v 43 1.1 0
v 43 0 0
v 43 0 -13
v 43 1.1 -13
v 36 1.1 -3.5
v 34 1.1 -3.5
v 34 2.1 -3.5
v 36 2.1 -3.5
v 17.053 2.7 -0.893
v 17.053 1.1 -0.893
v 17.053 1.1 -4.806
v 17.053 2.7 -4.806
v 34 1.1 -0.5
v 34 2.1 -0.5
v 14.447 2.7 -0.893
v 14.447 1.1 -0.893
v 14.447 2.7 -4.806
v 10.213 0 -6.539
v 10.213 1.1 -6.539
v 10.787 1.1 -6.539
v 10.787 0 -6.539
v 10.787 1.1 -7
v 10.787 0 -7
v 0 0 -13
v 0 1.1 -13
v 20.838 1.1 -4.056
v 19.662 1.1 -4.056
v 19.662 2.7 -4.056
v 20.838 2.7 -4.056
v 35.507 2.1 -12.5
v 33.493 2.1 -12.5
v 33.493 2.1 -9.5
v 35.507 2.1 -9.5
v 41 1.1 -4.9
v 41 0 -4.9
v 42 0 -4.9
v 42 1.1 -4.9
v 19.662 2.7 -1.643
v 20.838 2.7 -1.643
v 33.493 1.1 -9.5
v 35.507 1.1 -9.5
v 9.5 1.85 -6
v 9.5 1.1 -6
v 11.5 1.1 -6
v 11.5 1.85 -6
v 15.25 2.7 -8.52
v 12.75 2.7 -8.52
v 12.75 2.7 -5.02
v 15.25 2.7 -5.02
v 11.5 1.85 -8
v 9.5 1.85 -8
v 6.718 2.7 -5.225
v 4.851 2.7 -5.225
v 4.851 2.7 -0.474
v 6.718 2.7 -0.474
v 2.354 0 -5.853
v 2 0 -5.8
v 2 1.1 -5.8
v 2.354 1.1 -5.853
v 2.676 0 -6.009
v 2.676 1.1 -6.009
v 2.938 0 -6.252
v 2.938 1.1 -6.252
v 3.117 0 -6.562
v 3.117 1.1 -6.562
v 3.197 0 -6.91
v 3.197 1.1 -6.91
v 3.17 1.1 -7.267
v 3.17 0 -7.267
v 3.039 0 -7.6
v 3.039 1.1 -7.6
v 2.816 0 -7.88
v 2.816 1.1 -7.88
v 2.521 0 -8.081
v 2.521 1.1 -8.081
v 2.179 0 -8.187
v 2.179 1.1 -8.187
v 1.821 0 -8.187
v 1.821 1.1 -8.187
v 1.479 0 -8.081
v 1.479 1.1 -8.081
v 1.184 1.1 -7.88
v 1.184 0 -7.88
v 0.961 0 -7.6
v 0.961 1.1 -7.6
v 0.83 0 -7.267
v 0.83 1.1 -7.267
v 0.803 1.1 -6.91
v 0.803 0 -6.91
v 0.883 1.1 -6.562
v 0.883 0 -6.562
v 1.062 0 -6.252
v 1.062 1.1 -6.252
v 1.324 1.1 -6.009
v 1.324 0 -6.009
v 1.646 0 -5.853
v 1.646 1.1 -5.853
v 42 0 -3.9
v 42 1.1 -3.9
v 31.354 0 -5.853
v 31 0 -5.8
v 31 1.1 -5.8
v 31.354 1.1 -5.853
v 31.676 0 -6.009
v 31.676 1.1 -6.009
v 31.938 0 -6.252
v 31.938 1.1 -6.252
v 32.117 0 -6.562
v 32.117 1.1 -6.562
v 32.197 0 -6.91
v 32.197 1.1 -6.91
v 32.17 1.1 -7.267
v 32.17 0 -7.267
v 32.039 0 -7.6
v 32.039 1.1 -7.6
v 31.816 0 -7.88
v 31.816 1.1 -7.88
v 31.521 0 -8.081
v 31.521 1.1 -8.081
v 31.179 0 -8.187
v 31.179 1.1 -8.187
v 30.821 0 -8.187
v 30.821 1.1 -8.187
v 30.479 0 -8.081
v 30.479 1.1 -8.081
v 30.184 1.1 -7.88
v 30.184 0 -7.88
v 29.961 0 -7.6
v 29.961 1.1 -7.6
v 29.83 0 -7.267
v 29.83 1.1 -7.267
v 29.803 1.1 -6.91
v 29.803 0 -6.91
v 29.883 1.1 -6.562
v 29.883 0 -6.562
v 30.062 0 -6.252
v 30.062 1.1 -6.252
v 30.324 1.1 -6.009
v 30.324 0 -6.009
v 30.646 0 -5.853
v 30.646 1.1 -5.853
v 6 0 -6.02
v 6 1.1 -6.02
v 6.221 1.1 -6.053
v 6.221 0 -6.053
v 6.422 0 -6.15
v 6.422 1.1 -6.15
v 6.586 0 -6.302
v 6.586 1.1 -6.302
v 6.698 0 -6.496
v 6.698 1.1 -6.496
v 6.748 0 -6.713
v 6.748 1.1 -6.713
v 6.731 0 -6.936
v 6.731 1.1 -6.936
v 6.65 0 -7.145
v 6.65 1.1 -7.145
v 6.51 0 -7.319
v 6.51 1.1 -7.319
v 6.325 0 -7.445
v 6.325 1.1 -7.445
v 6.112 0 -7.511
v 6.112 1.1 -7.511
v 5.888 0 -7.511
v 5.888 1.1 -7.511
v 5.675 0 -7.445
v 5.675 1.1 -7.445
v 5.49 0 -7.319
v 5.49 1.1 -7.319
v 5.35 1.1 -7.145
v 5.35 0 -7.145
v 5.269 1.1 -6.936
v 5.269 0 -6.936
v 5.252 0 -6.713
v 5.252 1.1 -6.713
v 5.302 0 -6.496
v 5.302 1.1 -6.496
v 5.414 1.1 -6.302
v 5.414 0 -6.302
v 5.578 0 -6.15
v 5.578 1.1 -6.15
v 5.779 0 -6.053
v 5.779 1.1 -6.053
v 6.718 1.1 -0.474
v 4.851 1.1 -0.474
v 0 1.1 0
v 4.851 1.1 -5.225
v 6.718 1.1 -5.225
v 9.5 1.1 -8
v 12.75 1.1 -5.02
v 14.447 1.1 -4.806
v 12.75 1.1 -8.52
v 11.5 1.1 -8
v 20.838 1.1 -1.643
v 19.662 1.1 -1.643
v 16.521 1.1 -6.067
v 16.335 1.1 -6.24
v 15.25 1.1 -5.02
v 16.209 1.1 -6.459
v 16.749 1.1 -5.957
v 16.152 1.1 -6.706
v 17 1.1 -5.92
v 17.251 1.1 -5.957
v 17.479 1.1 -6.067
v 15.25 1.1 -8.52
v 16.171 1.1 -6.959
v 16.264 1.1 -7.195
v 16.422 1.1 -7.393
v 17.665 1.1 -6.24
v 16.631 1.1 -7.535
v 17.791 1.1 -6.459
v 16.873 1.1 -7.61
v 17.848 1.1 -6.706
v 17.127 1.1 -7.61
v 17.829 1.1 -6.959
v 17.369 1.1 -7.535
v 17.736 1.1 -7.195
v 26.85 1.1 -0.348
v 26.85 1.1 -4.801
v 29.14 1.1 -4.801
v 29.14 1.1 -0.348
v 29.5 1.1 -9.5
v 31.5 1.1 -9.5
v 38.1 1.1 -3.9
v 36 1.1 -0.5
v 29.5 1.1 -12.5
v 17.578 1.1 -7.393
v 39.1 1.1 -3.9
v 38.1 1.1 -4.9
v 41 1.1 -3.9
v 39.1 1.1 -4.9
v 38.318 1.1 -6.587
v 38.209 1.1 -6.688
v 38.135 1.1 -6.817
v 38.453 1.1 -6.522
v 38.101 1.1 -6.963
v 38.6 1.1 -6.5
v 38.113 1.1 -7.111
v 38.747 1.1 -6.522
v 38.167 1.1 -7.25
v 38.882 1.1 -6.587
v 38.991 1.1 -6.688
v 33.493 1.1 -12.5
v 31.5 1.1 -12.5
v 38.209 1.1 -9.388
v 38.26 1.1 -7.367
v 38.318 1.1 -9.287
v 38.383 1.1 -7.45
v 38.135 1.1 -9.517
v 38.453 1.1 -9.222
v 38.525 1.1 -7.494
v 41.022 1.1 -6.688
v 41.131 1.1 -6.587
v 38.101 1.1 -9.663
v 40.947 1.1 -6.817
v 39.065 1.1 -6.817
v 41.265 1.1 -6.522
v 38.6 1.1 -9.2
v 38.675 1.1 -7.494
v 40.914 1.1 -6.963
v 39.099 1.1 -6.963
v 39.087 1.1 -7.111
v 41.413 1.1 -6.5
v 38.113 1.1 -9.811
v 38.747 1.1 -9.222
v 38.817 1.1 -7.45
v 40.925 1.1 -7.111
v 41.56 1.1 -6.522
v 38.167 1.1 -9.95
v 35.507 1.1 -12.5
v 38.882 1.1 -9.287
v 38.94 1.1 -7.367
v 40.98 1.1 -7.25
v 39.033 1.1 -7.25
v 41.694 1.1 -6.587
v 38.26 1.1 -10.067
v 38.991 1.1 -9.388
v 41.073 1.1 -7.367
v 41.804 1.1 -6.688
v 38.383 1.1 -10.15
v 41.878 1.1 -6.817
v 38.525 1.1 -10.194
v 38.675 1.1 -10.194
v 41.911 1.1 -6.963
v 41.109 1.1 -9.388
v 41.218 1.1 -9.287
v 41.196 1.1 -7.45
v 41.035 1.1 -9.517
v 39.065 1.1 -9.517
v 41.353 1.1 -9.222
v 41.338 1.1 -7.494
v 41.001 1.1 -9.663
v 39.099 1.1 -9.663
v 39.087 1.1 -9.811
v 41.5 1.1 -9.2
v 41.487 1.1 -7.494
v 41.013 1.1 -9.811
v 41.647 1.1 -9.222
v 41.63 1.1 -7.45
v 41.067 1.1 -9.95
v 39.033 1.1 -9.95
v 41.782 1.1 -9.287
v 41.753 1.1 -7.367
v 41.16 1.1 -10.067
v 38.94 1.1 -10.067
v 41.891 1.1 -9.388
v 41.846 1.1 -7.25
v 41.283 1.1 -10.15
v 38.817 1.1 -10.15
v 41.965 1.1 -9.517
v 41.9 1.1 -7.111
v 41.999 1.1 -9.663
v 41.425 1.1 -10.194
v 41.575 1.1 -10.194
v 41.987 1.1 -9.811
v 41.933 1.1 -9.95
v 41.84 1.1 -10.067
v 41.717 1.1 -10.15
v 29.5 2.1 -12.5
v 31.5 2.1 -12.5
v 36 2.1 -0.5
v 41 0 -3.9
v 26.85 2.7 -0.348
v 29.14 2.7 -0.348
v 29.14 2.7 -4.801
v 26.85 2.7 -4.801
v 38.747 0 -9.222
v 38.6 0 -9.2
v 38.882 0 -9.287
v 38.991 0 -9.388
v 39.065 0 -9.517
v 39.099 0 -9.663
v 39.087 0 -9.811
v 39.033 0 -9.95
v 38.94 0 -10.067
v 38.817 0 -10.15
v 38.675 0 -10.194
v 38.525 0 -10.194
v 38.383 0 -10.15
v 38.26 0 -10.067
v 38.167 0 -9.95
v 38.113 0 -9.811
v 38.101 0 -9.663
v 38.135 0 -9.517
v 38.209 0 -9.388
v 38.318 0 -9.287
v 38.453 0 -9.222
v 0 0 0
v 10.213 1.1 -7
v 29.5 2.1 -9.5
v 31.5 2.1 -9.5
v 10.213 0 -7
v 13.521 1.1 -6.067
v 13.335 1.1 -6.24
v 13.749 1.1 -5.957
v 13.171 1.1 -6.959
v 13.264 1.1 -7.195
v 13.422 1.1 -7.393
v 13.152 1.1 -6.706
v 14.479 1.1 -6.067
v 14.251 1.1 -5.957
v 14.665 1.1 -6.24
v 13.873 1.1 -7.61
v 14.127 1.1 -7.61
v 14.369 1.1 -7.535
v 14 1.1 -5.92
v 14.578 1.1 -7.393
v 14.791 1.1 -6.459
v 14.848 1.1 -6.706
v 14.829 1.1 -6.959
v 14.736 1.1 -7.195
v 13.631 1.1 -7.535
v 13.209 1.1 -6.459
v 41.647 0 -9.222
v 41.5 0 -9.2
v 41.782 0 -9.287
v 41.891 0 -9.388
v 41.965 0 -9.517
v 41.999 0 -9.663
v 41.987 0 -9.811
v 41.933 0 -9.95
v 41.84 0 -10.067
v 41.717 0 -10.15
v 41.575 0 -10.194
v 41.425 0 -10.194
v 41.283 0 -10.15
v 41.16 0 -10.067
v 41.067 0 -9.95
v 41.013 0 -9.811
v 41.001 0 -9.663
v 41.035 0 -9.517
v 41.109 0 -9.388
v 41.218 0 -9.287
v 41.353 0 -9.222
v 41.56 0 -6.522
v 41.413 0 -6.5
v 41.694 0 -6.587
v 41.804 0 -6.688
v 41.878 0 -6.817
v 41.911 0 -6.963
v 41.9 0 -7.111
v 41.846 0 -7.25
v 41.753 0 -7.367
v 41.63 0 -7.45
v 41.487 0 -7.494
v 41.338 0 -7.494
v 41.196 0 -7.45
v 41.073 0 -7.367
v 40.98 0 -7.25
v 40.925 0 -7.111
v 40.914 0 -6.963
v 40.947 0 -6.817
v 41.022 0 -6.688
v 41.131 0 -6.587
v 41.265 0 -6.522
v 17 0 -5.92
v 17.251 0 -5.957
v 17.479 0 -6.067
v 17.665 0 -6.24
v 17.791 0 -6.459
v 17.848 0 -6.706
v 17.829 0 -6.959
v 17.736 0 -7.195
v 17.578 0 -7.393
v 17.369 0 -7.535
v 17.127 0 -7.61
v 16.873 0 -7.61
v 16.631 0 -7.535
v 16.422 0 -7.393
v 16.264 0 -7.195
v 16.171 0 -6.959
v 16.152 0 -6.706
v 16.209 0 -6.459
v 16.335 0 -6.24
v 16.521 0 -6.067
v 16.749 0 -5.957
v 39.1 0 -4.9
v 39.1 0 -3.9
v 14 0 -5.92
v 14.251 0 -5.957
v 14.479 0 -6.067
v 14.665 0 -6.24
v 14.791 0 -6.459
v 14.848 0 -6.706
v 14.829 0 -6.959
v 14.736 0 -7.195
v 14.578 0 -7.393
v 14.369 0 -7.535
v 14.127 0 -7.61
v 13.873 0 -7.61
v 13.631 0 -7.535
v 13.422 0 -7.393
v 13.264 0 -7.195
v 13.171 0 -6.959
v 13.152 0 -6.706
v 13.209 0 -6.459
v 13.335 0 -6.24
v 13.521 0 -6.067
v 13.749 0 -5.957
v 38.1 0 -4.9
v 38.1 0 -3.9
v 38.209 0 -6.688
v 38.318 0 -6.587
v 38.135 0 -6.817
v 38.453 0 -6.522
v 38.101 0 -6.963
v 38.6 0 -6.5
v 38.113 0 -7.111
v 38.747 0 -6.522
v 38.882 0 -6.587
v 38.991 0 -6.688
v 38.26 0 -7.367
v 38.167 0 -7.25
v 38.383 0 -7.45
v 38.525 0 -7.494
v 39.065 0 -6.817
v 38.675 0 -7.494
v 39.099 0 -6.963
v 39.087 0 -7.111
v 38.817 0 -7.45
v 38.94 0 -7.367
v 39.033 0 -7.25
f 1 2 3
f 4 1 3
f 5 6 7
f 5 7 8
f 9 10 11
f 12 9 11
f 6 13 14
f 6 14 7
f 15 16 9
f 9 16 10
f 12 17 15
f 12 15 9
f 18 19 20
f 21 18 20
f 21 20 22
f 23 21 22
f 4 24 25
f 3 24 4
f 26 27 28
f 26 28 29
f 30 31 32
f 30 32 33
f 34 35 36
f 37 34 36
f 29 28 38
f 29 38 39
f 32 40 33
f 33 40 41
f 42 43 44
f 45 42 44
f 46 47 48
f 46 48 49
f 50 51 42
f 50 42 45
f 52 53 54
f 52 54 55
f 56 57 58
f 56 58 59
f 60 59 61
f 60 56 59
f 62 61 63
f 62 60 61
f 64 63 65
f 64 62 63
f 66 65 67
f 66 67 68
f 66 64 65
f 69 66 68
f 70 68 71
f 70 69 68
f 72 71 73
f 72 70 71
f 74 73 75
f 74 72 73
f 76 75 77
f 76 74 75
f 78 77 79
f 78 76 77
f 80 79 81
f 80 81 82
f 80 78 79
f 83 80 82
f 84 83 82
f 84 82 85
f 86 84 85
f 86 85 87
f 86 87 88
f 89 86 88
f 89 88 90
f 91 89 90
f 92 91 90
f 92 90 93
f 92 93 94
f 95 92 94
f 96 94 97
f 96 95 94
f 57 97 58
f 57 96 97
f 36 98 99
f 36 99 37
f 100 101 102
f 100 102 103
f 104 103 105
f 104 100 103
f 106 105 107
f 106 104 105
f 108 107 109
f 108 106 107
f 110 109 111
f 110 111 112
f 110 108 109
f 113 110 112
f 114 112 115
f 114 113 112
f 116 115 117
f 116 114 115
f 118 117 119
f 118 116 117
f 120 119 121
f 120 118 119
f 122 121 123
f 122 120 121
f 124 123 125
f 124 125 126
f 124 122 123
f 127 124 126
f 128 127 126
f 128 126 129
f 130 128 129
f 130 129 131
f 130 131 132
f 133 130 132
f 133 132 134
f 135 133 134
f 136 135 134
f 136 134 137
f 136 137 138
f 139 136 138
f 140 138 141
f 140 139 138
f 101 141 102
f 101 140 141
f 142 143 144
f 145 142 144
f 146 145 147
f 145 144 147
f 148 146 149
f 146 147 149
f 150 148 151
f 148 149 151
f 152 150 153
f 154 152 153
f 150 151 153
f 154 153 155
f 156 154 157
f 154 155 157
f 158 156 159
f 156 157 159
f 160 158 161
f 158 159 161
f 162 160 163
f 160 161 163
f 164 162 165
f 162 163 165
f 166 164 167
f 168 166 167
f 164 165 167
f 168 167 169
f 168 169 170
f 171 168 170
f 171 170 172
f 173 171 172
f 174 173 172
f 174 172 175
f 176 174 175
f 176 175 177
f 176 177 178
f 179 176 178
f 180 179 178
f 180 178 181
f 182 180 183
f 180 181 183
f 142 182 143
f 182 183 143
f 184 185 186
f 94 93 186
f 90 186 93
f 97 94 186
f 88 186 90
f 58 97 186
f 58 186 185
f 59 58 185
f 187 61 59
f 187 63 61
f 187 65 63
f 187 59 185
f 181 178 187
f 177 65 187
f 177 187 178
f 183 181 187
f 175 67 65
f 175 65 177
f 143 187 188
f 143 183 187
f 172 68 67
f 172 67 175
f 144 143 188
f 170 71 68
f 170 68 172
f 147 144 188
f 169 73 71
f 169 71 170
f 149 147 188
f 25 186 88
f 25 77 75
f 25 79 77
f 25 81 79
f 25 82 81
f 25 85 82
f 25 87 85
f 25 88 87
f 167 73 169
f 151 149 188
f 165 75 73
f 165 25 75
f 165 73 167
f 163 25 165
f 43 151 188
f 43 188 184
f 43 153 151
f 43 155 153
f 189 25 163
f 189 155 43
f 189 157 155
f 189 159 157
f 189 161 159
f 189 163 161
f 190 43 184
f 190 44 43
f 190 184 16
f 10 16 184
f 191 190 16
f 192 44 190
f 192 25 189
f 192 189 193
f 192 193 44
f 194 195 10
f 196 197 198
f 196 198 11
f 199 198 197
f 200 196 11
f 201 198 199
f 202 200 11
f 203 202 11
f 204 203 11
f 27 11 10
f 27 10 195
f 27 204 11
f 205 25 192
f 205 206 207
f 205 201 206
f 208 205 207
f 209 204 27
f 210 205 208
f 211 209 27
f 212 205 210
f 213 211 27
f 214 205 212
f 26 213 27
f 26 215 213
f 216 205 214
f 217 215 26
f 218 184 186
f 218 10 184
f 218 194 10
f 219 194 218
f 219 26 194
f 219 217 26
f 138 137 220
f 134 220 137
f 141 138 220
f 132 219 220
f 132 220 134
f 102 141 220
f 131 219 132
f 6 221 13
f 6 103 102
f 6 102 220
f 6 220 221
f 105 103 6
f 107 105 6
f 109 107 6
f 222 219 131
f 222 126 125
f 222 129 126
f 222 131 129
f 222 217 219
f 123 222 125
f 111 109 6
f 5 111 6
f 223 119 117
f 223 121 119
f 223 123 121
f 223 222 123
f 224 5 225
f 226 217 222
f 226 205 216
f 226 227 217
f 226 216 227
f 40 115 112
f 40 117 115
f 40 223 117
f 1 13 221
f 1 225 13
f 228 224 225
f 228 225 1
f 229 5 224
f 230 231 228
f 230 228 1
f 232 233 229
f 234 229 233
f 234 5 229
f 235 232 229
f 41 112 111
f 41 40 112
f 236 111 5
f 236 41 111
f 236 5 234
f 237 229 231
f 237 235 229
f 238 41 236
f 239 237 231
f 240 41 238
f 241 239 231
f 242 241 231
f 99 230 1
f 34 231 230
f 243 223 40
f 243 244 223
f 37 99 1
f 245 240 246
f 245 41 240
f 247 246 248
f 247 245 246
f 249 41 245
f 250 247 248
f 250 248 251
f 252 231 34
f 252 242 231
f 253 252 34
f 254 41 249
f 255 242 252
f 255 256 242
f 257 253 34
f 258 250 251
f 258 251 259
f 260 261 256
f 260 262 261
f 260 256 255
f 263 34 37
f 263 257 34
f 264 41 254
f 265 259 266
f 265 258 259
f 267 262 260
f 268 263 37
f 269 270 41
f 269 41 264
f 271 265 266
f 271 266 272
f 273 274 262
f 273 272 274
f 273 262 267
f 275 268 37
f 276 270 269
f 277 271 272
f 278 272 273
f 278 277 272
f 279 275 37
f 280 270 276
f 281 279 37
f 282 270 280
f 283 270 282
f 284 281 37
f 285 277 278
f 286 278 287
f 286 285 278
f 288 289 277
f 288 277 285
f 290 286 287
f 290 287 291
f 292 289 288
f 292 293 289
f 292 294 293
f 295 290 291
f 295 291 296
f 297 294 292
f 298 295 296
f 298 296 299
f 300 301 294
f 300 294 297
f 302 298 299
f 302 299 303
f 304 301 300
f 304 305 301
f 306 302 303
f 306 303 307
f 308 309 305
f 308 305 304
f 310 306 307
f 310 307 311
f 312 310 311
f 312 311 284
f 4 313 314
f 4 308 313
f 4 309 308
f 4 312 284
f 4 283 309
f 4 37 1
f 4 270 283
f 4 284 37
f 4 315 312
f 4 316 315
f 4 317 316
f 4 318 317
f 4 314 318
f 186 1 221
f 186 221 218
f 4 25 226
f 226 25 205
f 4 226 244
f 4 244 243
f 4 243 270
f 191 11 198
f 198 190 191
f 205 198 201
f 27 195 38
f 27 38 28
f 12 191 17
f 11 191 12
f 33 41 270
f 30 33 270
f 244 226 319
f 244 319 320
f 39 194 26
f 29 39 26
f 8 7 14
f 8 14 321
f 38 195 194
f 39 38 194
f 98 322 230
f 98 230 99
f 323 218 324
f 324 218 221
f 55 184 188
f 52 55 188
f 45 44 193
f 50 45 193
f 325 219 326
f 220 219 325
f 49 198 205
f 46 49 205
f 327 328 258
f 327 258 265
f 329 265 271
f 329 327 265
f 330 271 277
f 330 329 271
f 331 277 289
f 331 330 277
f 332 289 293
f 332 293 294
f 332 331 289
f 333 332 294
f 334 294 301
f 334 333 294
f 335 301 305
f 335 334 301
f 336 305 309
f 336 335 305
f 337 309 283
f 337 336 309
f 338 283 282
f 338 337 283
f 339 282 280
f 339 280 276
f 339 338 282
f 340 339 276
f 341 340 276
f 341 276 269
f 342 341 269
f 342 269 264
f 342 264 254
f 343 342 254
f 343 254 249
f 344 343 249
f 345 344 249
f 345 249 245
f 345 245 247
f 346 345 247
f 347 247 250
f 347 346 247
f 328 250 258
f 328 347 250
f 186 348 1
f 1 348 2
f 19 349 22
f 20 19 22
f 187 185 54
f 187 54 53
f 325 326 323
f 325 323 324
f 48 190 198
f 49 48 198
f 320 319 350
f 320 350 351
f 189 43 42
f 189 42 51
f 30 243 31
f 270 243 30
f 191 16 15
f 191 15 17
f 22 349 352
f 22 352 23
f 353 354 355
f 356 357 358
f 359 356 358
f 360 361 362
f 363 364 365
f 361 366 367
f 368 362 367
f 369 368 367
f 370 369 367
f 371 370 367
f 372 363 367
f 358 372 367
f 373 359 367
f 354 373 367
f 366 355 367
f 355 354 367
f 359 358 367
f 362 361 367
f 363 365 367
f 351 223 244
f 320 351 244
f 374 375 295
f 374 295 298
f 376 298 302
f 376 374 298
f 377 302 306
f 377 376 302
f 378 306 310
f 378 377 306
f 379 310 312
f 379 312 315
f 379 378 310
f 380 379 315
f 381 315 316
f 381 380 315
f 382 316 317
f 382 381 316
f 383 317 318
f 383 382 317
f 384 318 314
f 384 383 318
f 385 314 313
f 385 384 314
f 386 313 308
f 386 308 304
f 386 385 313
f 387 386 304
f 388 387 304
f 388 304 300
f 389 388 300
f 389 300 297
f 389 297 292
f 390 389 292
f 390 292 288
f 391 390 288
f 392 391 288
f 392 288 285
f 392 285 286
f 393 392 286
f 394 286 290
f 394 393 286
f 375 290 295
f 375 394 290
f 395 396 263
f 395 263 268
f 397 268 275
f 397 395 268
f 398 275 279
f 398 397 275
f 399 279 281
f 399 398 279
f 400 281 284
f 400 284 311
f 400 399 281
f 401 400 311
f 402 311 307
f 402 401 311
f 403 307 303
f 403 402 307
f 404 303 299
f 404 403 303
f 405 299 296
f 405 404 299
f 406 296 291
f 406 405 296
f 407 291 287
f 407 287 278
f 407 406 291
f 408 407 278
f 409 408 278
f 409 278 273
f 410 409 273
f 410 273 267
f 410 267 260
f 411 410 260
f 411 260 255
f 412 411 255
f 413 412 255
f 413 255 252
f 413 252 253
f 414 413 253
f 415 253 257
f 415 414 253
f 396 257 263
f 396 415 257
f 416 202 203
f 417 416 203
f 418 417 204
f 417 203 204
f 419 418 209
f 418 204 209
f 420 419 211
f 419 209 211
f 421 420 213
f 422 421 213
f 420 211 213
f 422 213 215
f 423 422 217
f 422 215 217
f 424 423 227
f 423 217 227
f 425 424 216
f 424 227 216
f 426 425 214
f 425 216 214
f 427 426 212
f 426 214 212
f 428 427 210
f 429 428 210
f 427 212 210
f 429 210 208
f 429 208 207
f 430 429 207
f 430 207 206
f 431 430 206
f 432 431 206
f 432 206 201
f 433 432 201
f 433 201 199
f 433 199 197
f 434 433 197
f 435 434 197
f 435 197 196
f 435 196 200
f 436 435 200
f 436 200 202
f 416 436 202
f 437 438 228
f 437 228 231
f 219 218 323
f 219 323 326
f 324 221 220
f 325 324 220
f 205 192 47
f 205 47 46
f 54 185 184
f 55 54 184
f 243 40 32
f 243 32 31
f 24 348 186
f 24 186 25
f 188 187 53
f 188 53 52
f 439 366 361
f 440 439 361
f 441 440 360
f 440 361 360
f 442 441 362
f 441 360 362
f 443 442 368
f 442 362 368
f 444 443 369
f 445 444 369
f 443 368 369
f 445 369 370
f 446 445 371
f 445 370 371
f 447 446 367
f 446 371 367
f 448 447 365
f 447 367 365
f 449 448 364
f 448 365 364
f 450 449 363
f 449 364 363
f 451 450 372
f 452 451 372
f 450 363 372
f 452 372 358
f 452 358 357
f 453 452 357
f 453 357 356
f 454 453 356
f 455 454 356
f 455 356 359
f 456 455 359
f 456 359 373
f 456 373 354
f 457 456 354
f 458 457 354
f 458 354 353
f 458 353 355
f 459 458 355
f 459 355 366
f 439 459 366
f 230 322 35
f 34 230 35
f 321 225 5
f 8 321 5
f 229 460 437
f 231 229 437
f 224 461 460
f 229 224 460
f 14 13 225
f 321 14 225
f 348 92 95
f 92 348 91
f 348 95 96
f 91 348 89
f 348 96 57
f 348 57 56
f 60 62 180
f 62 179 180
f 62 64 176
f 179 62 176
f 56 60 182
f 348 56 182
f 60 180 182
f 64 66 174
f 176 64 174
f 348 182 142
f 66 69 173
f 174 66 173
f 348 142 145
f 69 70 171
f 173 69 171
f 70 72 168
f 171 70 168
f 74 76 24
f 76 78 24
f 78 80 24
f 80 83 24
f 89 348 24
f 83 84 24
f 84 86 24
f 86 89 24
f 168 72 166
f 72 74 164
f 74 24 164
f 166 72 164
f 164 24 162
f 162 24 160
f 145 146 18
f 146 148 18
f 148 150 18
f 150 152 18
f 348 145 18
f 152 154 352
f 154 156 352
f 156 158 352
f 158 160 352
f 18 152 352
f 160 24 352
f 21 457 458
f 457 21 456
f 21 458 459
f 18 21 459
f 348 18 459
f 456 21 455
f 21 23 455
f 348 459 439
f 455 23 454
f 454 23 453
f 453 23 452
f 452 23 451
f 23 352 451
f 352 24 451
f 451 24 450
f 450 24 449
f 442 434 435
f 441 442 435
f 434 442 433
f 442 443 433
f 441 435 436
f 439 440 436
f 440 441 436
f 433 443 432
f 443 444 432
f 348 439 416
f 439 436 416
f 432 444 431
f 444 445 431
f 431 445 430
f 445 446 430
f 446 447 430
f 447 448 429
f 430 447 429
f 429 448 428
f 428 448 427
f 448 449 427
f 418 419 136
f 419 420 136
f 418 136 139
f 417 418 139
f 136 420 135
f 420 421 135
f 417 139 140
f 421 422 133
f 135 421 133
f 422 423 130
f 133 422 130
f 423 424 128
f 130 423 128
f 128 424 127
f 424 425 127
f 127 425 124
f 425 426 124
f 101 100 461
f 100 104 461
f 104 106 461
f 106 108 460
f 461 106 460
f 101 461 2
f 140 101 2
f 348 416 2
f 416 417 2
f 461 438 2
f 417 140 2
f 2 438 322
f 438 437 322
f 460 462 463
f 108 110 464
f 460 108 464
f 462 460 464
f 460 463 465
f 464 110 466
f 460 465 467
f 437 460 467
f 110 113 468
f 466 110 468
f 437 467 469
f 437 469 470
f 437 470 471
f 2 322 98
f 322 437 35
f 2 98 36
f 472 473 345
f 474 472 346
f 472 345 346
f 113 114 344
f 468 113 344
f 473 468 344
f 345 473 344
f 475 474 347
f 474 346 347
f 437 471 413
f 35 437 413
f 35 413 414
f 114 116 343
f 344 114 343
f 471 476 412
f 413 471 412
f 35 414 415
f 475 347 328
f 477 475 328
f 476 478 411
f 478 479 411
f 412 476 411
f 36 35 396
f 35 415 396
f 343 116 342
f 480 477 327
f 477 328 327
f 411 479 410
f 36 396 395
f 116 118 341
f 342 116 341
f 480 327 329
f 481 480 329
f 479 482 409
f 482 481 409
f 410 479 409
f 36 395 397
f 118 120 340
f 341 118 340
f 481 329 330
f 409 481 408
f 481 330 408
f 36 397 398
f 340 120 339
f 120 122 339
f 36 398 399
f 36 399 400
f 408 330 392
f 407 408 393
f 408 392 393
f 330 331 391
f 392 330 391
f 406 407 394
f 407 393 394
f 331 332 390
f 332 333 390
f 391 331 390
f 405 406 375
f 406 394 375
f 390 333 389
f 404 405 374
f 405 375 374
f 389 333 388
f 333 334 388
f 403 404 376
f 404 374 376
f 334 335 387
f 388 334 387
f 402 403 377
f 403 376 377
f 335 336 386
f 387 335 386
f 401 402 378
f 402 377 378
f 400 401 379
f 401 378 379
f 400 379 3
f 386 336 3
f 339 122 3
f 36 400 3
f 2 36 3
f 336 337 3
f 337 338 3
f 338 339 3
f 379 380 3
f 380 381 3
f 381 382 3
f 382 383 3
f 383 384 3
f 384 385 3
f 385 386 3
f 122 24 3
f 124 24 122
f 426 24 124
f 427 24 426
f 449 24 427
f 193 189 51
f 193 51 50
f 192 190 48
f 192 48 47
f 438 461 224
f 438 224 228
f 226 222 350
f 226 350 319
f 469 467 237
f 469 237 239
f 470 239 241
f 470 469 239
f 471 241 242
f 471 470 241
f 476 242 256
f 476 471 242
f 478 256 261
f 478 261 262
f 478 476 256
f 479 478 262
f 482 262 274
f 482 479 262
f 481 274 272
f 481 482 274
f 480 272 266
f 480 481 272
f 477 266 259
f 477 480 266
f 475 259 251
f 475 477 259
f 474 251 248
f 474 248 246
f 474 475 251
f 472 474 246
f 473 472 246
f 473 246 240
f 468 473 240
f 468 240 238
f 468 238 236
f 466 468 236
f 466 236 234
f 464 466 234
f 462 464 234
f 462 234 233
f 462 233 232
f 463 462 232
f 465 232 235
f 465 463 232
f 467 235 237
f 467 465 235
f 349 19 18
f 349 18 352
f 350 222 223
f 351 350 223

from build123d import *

# Parameters (mm, degrees)
SKETCH1_W           = 43
SKETCH1_H           = 13
SKETCH1_R           = 1.2
SKETCH1_R_2         = 0.5
SKETCH1_W_2         = 1
SKETCH1_H_2         = 1
BOSS_EXTRUDE1_DEPTH = 1.1
SKETCH4_W           = 0.574829242
SKETCH4_H           = 0.46096735
CUT_EXTRUDE3_DEPTH  = 45.935620614
SKETCH2_R           = 0.75
CUT_EXTRUDE1_DEPTH  = 1.1
SKETCH5_R           = 0.85
CUT_EXTRUDE4_DEPTH  = 45.935620614
SKETCH3_W           = 2
SKETCH3_H           = 2
BOSS_EXTRUDE4_DEPTH = 0.75
SKETCH8_W           = 1.866359835
SKETCH8_H           = 4.750734125
SKETCH8_W_2         = 2.60606497
SKETCH8_H_2         = 3.913085661
SKETCH8_W_3         = 1.175159236
SKETCH8_H_3         = 2.413325778
SKETCH8_W_4         = 2.289773106
SKETCH8_H_4         = 4.453019048
SKETCH8_W_5         = 2.5
SKETCH8_H_5         = 3.5
BOSS_EXTRUDE5_DEPTH = 1.6
SKETCH9_W           = 2
SKETCH9_H           = 3
SKETCH9_W_2         = 2.013067154
BOSS_EXTRUDE6_DEPTH = 1
SKETCH11_R          = 1
BOSS_EXTRUDE7_DEPTH = 1.4


with BuildPart() as part:
    # Sketch1 → Boss-Extrude1 (new body)
    with BuildSketch(Plane(origin=(0, 0, 0), x_dir=(1, 0, 0), z_dir=(0, 1, 0))):
        with Locations((21.5, 6.5)):
            Rectangle(SKETCH1_W, SKETCH1_H)
        with Locations(Location((2, 7, 0), (0, 0, 270))):
            Circle(SKETCH1_R, mode=Mode.SUBTRACT)
        with Locations(Location((31, 7, 0), (0, 0, 270))):
            Circle(SKETCH1_R, mode=Mode.SUBTRACT)
        with Locations(Location((38.6, 7, 0), (0, 0, 270))):
            Circle(SKETCH1_R_2, mode=Mode.SUBTRACT)
        with Locations(Location((41.412673615, 7, 0), (0, 0, 270))):
            Circle(SKETCH1_R_2, mode=Mode.SUBTRACT)
        with Locations(Location((38.6, 9.7, 0), (0, 0, 270))):
            Circle(SKETCH1_R_2, mode=Mode.SUBTRACT)
        with Locations(Location((41.5, 9.7, 0), (0, 0, 270))):
            Circle(SKETCH1_R_2, mode=Mode.SUBTRACT)
        with Locations((38.6, 4.4)):
            Rectangle(SKETCH1_W_2, SKETCH1_H_2, mode=Mode.SUBTRACT)
        with Locations((41.5, 4.4)):
            Rectangle(SKETCH1_W_2, SKETCH1_H_2, mode=Mode.SUBTRACT)
    extrude(amount=BOSS_EXTRUDE1_DEPTH)

    # Sketch4 → Cut-Extrude3 (cut, through all)
    with BuildSketch(Plane(origin=(0, 1.1, 0), x_dir=(1, 0, 0), z_dir=(0, 1, 0))):
        with Locations((10.5, 6.769516325)):
            Rectangle(SKETCH4_W, SKETCH4_H)
    extrude(amount=-CUT_EXTRUDE3_DEPTH, mode=Mode.SUBTRACT)

    # Sketch2 → Cut-Extrude1 (cut)
    with BuildSketch(Plane(origin=(0, 1.1, 0), x_dir=(1, 0, 0), z_dir=(0, 1, 0))):
        with Locations(Location((6, 6.769516325, 0), (0, 0, 270))):
            Circle(SKETCH2_R)
    extrude(amount=-CUT_EXTRUDE1_DEPTH, mode=Mode.SUBTRACT)

    # Sketch5 → Cut-Extrude4 (cut, through all)
    with BuildSketch(Plane(origin=(0, 1.1, 0), x_dir=(1, 0, 0), z_dir=(0, 1, 0))):
        with Locations(Location((14, 6.769516325, 0), (0, 0, 270))):
            Circle(SKETCH5_R)
        with Locations(Location((17, 6.769516325, 0), (0, 0, 270))):
            Circle(SKETCH5_R)
    extrude(amount=-CUT_EXTRUDE4_DEPTH, mode=Mode.SUBTRACT)

    # Sketch3 → Boss-Extrude4 (add)
    with BuildSketch(Plane(origin=(0, 1.1, 0), x_dir=(1, 0, 0), z_dir=(0, 1, 0))):
        with Locations((10.5, 7)):
            Rectangle(SKETCH3_W, SKETCH3_H)
    extrude(amount=BOSS_EXTRUDE4_DEPTH)

    # Sketch8 → Boss-Extrude5 (add)
    with BuildSketch(Plane(origin=(0, 1.1, 0), x_dir=(1, 0, 0), z_dir=(0, 1, 0))):
        with Locations((5.784401845, 2.849545168)):
            Rectangle(SKETCH8_W, SKETCH8_H)
        with Locations((15.75, 2.849545168)):
            Rectangle(SKETCH8_W_2, SKETCH8_H_2)
        with Locations((20.25, 2.849545168)):
            Rectangle(SKETCH8_W_3, SKETCH8_H_3)
        with Locations((27.995132783, 2.574921462)):
            Rectangle(SKETCH8_W_4, SKETCH8_H_4)
        with Locations((14, 6.769516325)):
            Rectangle(SKETCH8_W_5, SKETCH8_H_5)
    extrude(amount=BOSS_EXTRUDE5_DEPTH)

    # Sketch9 → Boss-Extrude6 (add)
    with BuildSketch(Plane(origin=(0, 1.1, 0), x_dir=(1, 0, 0), z_dir=(0, 1, 0))):
        with Locations((35, 2)):
            Rectangle(SKETCH9_W, SKETCH9_H)
        with Locations((34.5, 11)):
            Rectangle(SKETCH9_W_2, SKETCH9_H)
        with Locations((30.5, 11)):
            Rectangle(SKETCH9_W, SKETCH9_H)
    extrude(amount=BOSS_EXTRUDE6_DEPTH)

    # Sketch11 → Boss-Extrude7 (add)
    with BuildSketch(Plane(origin=(0, 1.1, 0), x_dir=(1, 0, 0), z_dir=(0, 1, 0))):
        with Locations((14, 6.769516325)):
            Circle(SKETCH11_R)
    extrude(amount=BOSS_EXTRUDE7_DEPTH)


solid = part.part
